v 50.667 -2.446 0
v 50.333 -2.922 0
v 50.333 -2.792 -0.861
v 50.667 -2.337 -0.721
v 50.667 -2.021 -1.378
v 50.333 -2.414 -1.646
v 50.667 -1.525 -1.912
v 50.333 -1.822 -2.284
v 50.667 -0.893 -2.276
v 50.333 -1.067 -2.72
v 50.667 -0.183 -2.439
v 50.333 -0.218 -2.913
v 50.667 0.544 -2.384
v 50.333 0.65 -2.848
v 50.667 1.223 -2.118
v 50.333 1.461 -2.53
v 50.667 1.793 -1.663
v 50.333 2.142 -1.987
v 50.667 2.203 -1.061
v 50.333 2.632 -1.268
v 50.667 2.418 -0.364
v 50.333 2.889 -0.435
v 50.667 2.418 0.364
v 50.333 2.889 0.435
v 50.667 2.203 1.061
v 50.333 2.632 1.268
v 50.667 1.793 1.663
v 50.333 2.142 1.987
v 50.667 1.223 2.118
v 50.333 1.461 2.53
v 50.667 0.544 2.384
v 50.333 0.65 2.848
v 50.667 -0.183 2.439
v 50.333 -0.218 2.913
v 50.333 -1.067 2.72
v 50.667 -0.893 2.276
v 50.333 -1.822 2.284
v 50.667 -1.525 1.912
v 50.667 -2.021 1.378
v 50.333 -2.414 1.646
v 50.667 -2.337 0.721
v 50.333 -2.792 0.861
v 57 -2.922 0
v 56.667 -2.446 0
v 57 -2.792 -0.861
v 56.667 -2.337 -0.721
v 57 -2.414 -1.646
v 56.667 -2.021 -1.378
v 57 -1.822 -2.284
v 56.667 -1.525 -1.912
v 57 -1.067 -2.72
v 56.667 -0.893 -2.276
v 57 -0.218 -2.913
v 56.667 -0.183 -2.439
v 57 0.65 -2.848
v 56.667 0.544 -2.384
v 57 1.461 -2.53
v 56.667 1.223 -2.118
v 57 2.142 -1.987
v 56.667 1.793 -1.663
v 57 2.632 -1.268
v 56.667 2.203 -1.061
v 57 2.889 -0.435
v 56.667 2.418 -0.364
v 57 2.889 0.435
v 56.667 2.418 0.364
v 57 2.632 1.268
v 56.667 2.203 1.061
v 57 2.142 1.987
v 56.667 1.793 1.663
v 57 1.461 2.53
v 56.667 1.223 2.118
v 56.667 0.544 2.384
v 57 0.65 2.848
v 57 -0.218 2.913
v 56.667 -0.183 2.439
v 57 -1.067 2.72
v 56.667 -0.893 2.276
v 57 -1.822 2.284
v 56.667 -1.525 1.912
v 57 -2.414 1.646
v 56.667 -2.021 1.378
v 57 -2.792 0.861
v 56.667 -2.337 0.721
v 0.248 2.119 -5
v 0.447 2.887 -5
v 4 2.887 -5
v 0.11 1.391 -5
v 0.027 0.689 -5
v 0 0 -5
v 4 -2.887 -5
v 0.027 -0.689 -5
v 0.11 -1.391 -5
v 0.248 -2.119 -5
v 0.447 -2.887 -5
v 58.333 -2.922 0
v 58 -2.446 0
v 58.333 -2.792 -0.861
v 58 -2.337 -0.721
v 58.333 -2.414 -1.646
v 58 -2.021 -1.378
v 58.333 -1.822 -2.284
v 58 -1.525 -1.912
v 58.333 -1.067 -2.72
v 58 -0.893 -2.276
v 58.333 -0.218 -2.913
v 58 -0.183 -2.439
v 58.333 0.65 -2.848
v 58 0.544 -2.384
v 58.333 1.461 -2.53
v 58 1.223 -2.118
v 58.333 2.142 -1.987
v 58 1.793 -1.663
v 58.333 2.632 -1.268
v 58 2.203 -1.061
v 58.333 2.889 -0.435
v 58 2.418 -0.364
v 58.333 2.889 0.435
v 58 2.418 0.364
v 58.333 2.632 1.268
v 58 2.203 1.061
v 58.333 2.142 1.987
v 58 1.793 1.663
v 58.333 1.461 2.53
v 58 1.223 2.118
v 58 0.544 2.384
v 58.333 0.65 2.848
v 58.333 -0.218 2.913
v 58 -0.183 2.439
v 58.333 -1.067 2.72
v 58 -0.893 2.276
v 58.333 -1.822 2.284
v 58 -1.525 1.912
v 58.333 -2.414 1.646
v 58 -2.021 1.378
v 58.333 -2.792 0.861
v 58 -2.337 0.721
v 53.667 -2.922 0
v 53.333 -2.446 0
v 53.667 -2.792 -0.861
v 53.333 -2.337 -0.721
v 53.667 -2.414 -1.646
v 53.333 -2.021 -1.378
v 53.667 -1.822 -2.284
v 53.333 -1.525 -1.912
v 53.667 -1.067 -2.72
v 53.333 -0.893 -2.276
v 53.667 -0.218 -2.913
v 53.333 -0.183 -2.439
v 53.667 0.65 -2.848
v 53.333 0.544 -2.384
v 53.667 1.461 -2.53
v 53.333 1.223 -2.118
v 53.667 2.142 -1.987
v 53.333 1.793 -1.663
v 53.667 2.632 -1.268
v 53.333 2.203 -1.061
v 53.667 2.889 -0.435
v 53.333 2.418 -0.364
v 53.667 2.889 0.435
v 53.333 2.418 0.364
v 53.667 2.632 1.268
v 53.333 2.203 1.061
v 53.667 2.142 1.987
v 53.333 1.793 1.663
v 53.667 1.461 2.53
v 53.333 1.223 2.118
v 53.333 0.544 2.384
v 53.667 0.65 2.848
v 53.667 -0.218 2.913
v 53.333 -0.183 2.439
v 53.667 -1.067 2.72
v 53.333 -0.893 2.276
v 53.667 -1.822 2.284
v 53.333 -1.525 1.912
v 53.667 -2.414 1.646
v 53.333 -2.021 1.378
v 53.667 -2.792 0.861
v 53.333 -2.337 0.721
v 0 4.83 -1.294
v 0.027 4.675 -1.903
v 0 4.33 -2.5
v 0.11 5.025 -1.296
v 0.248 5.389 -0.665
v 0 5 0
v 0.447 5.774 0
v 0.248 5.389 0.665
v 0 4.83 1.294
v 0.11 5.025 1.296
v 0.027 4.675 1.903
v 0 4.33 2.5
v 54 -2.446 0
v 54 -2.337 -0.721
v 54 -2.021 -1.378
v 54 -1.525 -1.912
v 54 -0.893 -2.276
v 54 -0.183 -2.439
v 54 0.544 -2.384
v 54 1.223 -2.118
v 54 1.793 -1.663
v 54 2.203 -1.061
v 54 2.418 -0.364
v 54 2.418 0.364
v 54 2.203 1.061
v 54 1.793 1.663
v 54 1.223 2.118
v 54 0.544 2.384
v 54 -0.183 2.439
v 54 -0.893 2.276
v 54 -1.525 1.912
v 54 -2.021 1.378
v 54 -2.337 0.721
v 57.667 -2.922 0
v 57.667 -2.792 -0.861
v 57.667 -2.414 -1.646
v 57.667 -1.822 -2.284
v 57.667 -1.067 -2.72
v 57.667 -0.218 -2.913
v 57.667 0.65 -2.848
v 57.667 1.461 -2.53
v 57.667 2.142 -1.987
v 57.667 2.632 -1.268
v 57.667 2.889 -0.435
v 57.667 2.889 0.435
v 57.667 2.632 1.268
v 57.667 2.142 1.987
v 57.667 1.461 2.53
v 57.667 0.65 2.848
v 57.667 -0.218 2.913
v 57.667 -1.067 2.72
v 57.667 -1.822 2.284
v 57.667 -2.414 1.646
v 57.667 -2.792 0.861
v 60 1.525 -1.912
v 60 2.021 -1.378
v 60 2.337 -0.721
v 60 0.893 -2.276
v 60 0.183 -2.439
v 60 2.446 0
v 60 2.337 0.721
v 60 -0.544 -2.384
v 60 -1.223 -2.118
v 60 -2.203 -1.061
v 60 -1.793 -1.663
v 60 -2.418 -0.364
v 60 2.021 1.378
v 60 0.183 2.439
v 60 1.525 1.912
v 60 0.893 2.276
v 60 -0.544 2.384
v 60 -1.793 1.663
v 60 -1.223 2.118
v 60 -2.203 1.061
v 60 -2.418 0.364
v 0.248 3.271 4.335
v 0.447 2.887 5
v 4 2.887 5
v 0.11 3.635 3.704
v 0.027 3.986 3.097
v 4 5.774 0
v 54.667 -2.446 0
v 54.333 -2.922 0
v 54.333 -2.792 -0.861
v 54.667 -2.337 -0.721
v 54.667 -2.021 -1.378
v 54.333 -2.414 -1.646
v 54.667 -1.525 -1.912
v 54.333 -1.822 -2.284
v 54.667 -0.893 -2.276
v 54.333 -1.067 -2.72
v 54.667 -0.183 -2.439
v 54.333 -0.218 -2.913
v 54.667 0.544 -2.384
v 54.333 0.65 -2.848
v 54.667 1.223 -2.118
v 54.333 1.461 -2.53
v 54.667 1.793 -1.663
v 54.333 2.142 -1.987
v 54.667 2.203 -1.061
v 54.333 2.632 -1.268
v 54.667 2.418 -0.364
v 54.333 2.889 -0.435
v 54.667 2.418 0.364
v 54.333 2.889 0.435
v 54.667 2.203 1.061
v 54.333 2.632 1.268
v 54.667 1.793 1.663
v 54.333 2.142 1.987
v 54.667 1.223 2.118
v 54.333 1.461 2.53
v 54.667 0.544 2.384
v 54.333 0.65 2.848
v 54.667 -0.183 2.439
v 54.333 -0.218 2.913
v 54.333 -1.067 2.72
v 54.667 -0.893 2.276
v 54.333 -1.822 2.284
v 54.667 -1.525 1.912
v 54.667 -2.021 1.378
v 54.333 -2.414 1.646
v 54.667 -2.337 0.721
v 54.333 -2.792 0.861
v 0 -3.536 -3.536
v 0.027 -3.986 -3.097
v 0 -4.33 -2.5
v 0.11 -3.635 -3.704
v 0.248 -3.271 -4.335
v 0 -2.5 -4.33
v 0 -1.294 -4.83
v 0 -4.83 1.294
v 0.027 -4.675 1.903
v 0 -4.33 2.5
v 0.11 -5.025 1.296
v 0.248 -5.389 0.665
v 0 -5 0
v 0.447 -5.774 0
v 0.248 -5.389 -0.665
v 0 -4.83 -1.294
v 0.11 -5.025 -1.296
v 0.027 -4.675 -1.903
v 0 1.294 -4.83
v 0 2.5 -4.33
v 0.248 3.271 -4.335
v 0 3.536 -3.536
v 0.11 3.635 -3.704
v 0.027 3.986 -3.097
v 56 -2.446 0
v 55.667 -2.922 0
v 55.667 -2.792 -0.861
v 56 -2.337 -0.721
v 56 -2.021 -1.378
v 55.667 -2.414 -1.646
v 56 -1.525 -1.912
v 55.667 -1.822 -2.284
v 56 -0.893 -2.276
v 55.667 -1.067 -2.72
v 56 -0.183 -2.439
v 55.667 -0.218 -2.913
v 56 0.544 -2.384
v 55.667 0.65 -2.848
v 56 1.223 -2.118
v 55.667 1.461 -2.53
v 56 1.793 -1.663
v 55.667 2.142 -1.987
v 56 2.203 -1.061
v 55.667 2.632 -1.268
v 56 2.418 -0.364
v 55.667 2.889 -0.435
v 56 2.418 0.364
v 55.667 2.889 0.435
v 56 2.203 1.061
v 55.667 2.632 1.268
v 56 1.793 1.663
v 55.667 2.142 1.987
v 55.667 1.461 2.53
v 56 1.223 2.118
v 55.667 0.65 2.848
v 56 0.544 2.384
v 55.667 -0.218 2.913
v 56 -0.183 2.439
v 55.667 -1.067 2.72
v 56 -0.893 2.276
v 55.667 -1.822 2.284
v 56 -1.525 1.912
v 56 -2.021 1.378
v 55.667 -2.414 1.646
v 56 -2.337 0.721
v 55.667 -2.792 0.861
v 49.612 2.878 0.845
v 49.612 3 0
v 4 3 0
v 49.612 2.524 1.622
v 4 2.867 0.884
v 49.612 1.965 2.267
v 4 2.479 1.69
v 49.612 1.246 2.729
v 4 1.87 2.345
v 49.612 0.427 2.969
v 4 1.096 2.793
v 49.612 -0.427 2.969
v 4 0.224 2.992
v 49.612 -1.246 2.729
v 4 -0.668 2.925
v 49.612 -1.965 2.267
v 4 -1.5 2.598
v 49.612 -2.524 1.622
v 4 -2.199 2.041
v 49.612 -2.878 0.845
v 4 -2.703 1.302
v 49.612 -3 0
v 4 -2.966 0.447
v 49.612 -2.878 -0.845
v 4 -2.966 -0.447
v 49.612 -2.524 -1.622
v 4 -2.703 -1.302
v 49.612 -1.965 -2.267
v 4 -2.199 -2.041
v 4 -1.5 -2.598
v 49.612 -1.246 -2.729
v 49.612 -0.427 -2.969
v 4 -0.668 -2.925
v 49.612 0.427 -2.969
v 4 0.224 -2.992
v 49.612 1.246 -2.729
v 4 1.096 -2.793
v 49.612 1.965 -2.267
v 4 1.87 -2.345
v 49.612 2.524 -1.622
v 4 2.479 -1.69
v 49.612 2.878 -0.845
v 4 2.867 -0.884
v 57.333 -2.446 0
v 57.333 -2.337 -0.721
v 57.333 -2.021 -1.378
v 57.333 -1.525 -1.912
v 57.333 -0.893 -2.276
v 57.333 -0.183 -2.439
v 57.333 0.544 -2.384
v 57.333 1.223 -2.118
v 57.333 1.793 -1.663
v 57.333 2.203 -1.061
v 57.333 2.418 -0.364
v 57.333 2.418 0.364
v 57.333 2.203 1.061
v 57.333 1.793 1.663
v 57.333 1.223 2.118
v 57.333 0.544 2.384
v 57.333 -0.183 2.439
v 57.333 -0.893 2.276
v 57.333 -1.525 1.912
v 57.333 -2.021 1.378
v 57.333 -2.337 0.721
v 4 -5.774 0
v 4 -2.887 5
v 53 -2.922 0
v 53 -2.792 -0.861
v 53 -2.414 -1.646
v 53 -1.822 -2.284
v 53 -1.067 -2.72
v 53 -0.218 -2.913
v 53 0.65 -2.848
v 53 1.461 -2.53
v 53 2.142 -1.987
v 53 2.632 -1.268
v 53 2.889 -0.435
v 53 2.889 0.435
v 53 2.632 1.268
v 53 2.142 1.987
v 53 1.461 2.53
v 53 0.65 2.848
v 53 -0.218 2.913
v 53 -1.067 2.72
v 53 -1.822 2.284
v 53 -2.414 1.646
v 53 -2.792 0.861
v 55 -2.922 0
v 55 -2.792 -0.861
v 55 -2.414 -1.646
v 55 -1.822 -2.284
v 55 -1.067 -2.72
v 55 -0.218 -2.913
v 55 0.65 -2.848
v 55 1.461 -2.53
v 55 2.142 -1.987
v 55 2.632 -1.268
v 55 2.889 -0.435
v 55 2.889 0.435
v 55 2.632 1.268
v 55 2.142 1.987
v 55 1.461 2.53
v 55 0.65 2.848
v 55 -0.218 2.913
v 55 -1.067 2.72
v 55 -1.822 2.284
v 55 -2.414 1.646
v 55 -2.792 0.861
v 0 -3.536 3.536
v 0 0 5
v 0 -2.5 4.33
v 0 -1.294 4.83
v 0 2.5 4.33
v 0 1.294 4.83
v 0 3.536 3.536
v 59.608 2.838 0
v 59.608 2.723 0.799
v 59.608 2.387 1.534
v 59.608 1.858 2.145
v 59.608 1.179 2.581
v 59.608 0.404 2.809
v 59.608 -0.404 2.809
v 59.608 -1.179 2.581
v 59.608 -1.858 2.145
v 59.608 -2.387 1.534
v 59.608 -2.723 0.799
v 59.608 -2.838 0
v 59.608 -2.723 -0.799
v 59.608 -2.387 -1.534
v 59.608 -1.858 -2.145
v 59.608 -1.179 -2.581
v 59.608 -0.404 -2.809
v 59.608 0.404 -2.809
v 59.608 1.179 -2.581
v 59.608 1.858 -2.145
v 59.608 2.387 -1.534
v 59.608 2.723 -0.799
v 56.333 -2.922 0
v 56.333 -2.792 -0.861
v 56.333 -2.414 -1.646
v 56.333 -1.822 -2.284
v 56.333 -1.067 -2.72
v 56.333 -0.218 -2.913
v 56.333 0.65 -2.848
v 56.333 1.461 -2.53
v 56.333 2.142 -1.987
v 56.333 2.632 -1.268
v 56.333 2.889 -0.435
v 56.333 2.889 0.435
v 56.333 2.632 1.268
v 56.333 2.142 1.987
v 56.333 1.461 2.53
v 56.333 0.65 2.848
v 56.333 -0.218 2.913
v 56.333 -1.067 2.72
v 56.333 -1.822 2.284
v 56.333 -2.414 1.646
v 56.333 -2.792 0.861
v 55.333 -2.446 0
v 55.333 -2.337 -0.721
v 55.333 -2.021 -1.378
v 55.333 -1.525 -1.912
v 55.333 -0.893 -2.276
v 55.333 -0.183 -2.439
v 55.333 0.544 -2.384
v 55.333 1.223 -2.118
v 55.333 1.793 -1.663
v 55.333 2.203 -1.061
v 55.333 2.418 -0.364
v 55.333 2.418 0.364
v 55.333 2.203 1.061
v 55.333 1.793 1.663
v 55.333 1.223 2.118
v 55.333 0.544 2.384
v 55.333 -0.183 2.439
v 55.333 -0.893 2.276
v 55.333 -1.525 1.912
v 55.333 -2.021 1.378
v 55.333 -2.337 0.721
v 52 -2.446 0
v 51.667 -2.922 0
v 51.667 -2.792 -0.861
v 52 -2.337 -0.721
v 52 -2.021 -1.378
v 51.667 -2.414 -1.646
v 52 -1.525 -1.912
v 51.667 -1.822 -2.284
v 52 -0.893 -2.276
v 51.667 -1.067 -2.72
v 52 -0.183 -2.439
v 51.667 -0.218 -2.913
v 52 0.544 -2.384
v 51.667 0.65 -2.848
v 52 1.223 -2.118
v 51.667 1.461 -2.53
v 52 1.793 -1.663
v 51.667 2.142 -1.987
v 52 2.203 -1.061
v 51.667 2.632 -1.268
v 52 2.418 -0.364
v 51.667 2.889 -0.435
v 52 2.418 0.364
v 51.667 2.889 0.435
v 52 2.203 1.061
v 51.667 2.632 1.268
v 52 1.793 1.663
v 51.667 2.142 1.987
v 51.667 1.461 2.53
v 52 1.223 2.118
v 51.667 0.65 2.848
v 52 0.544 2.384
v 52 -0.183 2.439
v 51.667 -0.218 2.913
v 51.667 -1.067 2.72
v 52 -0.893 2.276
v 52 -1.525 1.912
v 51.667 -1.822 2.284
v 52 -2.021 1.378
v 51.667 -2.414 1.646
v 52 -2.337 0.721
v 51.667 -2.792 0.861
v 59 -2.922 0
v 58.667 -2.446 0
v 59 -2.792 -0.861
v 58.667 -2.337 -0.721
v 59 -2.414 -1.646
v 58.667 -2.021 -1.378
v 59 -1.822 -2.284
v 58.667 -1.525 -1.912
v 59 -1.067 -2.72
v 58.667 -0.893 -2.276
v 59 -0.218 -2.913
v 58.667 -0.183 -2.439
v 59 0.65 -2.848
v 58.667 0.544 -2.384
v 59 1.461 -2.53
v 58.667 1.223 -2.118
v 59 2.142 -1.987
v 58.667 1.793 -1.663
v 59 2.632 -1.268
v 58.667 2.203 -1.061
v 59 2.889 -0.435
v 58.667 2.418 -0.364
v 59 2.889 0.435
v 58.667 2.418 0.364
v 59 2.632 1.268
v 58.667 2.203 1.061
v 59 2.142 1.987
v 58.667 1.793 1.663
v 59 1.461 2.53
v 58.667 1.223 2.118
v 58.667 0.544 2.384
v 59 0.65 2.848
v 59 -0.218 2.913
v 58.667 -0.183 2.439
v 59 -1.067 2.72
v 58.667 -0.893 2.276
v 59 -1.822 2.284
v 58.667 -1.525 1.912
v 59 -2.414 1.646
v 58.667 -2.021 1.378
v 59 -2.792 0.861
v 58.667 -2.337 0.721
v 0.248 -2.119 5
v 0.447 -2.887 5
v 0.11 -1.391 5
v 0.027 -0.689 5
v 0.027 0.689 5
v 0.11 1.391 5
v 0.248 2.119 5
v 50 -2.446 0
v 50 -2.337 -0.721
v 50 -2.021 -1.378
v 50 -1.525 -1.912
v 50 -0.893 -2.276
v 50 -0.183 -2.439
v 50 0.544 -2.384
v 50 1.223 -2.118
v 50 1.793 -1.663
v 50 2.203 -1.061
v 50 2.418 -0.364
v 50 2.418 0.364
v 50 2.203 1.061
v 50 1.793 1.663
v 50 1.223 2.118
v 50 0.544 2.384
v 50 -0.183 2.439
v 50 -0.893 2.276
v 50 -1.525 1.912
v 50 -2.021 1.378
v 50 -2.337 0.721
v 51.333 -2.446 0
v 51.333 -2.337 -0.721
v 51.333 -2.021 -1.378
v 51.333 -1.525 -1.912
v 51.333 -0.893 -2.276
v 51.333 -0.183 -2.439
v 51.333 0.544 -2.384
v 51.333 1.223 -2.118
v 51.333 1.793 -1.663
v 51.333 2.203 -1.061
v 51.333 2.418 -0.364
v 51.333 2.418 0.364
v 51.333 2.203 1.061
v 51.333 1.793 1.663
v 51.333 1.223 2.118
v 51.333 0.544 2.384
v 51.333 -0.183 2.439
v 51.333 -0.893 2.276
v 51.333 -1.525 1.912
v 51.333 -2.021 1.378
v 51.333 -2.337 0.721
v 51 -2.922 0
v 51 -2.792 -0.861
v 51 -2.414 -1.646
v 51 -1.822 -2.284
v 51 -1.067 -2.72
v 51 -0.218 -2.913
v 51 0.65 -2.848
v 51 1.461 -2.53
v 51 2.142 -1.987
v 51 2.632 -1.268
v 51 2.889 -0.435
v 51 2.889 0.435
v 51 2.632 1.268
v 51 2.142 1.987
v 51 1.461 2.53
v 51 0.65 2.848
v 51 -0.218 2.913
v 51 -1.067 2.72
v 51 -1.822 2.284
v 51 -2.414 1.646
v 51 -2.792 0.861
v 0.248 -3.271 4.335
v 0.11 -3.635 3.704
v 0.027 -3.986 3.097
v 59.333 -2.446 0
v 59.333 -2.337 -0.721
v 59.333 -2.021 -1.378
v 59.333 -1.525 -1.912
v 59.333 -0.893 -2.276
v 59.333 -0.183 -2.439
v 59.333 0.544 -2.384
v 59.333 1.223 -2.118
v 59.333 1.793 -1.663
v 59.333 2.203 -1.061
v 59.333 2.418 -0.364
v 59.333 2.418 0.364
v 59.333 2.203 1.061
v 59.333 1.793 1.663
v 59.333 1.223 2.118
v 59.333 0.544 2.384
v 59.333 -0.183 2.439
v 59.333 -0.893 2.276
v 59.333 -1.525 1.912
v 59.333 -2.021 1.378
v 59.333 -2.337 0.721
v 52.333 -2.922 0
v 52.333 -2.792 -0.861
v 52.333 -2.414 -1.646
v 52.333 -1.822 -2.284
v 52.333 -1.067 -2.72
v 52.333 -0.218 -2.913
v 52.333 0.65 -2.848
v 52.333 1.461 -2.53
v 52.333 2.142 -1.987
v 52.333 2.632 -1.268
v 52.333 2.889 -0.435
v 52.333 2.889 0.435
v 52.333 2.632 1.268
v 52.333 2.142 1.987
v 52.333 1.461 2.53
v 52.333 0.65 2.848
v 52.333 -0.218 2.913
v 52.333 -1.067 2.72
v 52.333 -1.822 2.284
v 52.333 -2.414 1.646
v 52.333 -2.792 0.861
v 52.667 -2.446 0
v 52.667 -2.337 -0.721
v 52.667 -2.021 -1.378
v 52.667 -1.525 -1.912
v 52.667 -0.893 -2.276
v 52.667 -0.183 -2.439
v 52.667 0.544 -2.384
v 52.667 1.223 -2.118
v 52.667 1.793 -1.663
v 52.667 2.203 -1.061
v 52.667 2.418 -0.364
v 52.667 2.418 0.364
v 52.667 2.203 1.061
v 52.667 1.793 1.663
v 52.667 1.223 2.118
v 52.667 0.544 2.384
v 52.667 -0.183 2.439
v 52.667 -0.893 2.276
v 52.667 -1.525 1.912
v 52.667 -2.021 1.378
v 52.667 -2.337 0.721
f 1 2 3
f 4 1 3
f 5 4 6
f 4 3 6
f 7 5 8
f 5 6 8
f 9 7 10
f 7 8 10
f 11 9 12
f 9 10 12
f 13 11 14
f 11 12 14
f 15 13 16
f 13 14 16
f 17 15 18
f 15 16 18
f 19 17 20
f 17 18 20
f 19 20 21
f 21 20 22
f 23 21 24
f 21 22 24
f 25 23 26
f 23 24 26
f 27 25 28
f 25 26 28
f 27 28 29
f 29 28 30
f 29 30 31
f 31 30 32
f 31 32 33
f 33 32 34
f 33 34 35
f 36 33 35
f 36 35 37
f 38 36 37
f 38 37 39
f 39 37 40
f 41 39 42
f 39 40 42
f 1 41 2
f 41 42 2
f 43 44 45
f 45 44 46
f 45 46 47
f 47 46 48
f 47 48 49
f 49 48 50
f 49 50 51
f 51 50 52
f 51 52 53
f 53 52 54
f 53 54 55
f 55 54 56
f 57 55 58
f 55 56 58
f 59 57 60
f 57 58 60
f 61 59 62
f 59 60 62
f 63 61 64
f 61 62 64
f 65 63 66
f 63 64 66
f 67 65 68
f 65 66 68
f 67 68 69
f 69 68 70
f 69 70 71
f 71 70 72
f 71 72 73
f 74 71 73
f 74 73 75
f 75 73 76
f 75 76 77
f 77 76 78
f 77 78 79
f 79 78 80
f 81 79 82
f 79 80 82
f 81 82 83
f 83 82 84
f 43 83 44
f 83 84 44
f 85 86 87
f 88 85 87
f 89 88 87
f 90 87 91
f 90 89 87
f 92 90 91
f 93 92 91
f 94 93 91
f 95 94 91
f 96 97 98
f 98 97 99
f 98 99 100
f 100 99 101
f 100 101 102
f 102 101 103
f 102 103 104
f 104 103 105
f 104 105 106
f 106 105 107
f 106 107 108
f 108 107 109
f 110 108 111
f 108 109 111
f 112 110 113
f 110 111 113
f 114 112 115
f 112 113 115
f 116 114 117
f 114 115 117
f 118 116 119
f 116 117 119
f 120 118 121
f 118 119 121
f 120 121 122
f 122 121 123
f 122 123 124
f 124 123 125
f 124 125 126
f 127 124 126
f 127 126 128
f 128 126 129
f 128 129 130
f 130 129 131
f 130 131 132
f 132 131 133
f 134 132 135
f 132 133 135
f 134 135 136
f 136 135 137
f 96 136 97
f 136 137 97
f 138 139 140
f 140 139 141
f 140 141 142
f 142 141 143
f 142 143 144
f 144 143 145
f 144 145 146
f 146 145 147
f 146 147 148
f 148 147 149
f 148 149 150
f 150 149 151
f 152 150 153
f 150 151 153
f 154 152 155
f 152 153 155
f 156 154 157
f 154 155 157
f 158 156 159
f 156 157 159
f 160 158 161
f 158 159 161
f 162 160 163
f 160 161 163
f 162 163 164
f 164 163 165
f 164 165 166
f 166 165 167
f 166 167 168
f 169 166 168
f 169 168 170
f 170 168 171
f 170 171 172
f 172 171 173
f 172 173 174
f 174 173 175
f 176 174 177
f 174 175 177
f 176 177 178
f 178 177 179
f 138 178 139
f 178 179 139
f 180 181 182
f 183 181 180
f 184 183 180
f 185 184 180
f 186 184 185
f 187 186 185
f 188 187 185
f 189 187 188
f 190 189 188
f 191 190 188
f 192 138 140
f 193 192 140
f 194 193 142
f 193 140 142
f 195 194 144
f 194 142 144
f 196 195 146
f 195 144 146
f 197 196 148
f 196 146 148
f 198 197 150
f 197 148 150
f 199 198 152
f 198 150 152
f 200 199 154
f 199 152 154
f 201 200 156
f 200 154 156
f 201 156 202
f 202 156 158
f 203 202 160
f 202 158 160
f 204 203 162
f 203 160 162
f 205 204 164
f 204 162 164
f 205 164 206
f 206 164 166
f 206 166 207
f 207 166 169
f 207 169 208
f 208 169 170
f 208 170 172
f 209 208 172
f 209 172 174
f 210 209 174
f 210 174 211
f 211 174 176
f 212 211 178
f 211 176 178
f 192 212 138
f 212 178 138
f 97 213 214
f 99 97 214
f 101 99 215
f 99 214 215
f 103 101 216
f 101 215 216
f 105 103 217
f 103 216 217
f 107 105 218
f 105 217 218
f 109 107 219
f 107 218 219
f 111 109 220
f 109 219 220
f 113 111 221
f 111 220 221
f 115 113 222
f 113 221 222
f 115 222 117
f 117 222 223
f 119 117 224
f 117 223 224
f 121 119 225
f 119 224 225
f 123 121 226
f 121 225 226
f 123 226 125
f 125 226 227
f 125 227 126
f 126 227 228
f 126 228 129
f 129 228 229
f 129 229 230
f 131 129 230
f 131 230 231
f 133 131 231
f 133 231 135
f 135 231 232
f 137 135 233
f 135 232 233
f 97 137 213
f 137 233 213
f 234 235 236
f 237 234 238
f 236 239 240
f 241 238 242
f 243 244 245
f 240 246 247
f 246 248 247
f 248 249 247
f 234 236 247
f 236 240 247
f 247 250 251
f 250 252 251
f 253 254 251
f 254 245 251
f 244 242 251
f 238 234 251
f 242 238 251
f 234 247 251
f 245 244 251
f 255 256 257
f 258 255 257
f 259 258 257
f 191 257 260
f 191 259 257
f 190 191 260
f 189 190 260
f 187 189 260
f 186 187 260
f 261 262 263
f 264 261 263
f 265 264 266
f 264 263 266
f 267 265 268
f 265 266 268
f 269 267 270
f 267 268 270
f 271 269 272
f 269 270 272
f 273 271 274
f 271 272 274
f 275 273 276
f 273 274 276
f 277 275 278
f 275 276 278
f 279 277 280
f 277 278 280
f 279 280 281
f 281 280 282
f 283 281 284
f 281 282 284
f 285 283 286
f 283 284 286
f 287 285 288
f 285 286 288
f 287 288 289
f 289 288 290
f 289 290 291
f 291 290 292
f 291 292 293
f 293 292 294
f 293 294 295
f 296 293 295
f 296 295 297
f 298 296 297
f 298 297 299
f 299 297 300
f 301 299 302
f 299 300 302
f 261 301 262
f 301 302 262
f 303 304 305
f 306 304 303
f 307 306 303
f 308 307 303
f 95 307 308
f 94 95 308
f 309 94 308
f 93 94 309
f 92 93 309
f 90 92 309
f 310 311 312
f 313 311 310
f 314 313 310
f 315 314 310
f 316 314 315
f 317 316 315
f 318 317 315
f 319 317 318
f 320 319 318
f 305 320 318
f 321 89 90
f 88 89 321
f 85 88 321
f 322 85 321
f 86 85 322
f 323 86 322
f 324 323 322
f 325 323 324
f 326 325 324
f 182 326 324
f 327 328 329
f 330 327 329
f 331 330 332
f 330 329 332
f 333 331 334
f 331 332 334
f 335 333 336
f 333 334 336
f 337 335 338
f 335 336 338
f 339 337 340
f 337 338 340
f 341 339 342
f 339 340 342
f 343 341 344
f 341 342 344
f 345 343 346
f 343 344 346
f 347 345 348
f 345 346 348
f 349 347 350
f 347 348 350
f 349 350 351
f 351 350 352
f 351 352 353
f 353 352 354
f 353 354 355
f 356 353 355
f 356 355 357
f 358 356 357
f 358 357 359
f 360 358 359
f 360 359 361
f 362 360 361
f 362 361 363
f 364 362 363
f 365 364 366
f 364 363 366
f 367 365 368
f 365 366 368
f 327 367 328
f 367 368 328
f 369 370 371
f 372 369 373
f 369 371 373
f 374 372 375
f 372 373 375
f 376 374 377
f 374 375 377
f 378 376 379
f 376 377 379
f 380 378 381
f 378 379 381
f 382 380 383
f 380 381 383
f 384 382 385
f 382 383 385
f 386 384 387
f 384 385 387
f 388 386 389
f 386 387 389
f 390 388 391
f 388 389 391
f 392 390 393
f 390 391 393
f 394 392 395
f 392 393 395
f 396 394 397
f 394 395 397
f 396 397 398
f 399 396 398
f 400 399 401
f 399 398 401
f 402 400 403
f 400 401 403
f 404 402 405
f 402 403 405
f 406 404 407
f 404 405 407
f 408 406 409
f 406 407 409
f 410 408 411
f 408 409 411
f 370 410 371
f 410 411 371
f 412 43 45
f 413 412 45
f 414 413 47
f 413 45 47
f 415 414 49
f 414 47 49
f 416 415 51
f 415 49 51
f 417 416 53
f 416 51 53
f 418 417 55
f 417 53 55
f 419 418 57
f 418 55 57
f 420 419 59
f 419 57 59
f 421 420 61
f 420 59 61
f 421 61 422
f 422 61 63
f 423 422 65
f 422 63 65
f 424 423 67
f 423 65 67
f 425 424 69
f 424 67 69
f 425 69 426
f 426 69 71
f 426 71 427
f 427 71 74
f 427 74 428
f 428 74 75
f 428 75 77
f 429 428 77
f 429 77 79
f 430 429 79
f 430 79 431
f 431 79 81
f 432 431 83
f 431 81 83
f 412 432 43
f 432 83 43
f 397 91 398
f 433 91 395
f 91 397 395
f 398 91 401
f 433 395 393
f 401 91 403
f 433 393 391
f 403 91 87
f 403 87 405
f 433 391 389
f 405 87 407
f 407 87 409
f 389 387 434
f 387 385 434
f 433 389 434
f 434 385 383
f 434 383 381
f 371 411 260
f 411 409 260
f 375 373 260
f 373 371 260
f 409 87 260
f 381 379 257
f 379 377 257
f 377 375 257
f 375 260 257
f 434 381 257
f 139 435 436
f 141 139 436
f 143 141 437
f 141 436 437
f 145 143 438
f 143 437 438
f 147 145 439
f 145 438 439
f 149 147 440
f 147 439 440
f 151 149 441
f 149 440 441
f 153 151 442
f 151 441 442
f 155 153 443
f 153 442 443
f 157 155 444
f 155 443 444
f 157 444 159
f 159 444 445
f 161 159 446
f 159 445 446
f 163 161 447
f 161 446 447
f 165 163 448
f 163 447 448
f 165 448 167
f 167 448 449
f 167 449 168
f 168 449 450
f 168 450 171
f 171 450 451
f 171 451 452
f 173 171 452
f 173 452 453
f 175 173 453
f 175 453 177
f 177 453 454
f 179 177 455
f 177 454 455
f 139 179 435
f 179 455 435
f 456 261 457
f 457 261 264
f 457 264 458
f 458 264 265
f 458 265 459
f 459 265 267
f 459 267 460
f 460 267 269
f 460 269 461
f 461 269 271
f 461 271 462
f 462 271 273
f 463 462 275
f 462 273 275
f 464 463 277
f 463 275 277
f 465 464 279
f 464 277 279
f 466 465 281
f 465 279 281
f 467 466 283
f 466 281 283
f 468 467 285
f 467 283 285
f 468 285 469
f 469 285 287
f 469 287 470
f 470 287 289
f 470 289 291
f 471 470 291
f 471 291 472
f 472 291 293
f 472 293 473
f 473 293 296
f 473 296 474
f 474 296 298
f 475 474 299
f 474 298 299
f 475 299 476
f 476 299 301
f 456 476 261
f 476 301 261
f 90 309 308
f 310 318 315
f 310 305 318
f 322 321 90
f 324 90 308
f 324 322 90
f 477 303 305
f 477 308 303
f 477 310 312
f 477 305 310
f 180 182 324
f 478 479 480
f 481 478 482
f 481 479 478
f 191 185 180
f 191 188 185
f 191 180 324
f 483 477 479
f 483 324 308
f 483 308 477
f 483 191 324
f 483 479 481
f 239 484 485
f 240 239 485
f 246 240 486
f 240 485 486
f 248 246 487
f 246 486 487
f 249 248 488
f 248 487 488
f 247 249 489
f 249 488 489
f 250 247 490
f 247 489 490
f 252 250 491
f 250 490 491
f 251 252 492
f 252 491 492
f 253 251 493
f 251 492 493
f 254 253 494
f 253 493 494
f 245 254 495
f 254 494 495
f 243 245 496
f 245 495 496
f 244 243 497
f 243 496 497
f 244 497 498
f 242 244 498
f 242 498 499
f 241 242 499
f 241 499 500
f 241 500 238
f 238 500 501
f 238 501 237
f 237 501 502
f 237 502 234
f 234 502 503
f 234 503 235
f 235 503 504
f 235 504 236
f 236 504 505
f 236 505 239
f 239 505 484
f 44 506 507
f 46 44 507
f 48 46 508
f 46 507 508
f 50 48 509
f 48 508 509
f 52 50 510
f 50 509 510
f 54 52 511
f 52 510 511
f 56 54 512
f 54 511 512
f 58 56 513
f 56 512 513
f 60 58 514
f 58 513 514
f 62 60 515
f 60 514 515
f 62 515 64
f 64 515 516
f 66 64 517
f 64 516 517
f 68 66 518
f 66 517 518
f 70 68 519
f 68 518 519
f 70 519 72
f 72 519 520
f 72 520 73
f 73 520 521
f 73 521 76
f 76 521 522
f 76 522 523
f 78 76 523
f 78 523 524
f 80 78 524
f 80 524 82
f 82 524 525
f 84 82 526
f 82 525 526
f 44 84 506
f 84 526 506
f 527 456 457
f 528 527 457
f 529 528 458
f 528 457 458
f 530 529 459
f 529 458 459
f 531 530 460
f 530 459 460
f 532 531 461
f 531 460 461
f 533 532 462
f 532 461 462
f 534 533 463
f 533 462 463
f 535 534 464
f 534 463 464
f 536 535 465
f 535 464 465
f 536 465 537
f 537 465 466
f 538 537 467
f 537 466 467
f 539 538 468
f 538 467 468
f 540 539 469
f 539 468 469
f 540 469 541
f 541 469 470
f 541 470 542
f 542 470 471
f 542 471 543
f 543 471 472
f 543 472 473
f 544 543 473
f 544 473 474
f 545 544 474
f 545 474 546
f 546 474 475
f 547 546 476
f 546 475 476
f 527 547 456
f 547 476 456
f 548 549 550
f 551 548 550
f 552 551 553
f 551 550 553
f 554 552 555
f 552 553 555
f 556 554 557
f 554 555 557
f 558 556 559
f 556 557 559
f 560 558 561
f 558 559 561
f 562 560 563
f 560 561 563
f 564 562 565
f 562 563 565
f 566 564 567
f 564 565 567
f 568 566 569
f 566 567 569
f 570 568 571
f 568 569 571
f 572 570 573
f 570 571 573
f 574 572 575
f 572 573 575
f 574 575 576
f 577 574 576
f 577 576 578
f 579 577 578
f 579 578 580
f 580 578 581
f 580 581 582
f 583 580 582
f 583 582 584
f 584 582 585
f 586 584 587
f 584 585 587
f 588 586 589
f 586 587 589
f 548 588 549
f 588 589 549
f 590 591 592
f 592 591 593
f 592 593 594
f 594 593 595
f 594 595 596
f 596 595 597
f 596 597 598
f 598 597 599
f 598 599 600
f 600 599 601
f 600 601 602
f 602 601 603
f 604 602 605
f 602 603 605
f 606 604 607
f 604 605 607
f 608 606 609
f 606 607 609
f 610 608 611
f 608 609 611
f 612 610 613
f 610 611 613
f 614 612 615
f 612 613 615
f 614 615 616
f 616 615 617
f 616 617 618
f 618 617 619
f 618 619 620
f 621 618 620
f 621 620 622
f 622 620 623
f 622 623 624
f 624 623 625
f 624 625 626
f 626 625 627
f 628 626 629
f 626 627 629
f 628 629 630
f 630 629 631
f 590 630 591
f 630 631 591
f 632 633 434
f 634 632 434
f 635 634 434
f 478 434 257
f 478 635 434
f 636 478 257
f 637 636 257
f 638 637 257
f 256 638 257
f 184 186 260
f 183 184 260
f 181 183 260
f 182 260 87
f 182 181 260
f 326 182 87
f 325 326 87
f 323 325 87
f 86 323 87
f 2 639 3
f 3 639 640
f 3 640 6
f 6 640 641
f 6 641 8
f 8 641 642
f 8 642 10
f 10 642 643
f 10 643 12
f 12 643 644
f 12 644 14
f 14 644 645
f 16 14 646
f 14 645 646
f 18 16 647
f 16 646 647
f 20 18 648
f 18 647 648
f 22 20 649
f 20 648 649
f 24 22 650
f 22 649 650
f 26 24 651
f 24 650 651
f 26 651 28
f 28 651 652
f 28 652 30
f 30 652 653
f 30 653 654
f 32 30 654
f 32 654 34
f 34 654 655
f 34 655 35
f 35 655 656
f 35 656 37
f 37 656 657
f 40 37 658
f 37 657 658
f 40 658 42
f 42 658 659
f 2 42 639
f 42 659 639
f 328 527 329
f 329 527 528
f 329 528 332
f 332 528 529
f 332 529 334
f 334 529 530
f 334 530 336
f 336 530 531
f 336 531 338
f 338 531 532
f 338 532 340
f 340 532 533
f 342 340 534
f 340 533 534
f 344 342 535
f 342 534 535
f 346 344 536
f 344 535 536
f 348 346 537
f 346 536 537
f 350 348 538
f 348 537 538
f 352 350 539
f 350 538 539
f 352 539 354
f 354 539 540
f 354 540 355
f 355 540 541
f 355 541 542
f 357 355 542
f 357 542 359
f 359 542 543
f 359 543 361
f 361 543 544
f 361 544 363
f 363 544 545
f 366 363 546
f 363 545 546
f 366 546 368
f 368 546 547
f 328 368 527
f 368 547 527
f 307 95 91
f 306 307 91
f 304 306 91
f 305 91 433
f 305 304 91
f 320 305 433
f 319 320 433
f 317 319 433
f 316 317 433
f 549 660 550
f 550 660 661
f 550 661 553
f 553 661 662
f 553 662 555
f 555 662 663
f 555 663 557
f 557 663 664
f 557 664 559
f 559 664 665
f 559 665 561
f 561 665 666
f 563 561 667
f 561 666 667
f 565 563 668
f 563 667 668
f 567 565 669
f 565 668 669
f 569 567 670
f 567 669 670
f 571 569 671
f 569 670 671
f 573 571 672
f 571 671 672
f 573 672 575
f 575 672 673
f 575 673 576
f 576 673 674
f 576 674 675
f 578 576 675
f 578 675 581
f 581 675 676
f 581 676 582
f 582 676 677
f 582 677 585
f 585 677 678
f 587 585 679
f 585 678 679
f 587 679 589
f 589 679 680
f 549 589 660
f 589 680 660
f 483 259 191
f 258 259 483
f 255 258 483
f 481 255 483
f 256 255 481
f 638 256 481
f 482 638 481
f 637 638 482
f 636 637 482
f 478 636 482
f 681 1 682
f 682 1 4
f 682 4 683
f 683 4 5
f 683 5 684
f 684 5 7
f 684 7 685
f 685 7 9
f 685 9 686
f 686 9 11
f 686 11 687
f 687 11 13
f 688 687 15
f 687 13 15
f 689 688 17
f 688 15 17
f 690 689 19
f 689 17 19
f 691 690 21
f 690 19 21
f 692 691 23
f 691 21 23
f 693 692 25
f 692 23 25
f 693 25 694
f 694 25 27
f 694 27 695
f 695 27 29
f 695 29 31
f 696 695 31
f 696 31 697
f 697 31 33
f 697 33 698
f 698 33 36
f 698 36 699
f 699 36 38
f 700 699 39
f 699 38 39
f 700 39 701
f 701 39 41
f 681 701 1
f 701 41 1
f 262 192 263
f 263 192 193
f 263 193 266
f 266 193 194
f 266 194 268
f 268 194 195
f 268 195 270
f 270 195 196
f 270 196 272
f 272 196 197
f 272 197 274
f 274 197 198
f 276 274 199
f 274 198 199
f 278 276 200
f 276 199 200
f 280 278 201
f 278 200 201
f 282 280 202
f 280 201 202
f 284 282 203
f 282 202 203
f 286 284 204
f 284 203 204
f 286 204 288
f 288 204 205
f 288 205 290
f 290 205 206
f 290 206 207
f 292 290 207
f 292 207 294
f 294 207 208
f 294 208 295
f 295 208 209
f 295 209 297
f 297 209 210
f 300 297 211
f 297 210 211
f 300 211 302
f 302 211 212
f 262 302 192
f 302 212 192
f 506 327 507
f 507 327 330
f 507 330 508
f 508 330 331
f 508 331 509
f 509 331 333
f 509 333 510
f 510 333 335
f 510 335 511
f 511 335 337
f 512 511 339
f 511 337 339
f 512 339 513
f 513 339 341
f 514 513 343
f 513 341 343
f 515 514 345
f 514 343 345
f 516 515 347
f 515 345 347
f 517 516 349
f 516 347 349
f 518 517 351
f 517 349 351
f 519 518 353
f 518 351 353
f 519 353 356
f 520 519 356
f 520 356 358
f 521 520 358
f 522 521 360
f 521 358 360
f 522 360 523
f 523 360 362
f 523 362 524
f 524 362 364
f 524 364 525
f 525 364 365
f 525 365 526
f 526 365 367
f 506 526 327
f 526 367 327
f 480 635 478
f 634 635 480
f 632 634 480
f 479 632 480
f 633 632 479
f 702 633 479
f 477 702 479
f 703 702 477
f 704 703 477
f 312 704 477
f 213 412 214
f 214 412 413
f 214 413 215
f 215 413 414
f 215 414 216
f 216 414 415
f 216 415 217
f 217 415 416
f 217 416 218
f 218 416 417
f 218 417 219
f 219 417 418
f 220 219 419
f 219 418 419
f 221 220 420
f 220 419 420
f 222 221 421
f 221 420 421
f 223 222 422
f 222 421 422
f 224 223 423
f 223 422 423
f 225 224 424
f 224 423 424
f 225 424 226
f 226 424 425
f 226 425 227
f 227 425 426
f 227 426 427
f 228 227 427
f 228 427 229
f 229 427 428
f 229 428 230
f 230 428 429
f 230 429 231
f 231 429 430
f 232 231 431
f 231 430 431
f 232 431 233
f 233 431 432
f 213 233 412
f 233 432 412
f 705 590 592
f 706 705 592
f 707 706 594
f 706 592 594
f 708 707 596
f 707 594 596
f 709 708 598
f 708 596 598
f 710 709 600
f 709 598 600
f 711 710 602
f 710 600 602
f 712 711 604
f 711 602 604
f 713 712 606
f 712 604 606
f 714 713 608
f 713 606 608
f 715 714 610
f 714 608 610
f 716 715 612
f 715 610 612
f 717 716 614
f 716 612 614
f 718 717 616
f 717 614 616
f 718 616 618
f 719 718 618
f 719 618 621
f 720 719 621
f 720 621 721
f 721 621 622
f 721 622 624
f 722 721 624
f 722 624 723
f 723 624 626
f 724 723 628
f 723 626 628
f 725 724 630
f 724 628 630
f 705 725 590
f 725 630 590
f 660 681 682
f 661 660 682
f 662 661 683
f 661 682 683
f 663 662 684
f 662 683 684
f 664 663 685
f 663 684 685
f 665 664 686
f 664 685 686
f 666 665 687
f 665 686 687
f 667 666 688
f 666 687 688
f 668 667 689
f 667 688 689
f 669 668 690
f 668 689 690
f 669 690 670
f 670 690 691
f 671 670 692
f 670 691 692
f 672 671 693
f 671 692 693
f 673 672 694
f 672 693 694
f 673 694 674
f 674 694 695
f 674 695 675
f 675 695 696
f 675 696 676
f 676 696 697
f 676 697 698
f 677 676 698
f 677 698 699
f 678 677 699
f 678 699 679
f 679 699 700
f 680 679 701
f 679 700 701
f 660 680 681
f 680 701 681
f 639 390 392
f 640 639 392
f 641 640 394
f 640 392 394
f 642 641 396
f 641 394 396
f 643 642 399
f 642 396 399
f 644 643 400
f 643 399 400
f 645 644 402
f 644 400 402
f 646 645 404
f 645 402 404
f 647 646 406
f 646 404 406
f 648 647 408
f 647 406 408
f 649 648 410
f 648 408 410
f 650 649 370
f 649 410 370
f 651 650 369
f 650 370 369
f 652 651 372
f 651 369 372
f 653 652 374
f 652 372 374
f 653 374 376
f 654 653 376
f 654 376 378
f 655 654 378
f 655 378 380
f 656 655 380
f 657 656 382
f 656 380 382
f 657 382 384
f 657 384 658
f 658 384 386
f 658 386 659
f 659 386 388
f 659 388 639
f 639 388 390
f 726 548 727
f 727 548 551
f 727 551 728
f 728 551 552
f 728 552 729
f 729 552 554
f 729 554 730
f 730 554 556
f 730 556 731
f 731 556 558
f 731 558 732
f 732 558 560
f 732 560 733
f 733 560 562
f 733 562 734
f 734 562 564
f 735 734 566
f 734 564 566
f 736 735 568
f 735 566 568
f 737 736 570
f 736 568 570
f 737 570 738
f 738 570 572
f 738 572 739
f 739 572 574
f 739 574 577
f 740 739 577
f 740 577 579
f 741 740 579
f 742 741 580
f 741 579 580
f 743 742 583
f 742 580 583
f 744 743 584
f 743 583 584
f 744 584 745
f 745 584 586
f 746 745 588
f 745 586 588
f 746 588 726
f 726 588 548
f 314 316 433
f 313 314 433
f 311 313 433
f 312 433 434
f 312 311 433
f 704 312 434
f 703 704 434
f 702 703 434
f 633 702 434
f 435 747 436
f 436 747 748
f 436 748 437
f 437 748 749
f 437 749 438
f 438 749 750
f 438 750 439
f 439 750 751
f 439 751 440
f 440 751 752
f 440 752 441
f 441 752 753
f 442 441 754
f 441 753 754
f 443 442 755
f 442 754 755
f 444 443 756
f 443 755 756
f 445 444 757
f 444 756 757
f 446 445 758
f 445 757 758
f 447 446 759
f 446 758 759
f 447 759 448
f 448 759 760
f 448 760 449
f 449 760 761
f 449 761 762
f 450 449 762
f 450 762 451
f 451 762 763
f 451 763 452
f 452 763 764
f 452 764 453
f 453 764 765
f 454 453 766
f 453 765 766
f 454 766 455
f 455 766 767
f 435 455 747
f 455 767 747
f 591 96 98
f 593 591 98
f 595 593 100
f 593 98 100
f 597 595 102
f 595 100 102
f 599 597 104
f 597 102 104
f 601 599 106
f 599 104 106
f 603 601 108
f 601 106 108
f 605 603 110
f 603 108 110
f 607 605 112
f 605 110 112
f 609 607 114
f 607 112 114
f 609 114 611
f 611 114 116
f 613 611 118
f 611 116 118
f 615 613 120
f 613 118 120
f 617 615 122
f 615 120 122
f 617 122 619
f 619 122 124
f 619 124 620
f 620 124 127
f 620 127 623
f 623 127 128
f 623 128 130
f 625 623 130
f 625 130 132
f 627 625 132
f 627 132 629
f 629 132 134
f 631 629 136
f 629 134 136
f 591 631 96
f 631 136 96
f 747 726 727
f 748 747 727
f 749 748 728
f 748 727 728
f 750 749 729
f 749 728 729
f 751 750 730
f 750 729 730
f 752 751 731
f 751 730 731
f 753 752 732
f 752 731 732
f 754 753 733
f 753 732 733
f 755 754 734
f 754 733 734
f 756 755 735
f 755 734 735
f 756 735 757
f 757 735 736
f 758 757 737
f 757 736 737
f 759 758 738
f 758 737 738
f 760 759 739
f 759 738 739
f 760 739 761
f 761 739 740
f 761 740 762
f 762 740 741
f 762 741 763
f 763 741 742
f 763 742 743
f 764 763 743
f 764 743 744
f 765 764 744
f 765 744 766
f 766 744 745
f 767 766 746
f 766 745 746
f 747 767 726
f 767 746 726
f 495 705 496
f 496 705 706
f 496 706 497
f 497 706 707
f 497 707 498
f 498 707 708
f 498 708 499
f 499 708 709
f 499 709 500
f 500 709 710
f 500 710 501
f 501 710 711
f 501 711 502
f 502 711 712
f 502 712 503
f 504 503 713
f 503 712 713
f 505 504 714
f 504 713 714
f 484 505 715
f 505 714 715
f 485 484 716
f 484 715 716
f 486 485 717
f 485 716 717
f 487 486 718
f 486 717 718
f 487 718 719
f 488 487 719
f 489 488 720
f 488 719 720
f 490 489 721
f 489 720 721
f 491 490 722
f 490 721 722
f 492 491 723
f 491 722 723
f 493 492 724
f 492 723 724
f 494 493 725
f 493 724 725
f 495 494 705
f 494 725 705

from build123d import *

# Parameters (mm, degrees)
BASEHEAD_DEPTH  = 4
THDSCHPAT_COUNT = 15
THDSCHPAT_PITCH = 0.666666667


with BuildPart() as part:
    # Sketch1 → BaseHead (new body)
    with BuildSketch(Plane(origin=(0, 0, 0), x_dir=(0, 0, -1), z_dir=(1, 0, 0))):
        Polygon((5, 2.886751346), (5, -2.886751346), (0, -5.773502692), (-5, -2.886751346), (-5, 2.886751346), (0, 5.773502692), align=None)
    extrude(amount=BASEHEAD_DEPTH)

    # BodySke → BaseBody (revolve)
    with BuildSketch(Plane.XY):
        Polygon((0, 0), (60, 0), (60, 2.4455), (59.4455, 3), (0, 3), align=None)
    revolve(axis=Axis((0, 0, 0), (1, 0, 0)))

    # Sketch3 → HeadChamfer (revolve, cut)
    with BuildSketch(Plane.XY):
        Polygon((0, 5), (3.333333333, 10.773502692), (3.333333333, 15.773502692), (-10, 15.773502692), (-10, 5), align=None)
    revolve(axis=Axis((0, 0, 0), (1, 0, 0)), mode=Mode.SUBTRACT)

    # ThdSchSke → ThreadSchematic (revolve, cut)
    with BuildSketch(Plane.XY):
        Polygon((50, -2.4455), (49.61173492, -3), (49.61173492, -3.75), (50.38826508, -3.75), (50.38826508, -3), align=None)
    threadschematic = revolve(axis=Axis((-3.175, 0, 0), (1, 0, 0)), mode=Mode.SUBTRACT)

    # ThdSchPat: ThreadSchematic ×15
    with Locations(*[(i * THDSCHPAT_PITCH, 0, 0) for i in range(1, THDSCHPAT_COUNT)]):
        add(threadschematic, mode=Mode.SUBTRACT)


solid = part.part
